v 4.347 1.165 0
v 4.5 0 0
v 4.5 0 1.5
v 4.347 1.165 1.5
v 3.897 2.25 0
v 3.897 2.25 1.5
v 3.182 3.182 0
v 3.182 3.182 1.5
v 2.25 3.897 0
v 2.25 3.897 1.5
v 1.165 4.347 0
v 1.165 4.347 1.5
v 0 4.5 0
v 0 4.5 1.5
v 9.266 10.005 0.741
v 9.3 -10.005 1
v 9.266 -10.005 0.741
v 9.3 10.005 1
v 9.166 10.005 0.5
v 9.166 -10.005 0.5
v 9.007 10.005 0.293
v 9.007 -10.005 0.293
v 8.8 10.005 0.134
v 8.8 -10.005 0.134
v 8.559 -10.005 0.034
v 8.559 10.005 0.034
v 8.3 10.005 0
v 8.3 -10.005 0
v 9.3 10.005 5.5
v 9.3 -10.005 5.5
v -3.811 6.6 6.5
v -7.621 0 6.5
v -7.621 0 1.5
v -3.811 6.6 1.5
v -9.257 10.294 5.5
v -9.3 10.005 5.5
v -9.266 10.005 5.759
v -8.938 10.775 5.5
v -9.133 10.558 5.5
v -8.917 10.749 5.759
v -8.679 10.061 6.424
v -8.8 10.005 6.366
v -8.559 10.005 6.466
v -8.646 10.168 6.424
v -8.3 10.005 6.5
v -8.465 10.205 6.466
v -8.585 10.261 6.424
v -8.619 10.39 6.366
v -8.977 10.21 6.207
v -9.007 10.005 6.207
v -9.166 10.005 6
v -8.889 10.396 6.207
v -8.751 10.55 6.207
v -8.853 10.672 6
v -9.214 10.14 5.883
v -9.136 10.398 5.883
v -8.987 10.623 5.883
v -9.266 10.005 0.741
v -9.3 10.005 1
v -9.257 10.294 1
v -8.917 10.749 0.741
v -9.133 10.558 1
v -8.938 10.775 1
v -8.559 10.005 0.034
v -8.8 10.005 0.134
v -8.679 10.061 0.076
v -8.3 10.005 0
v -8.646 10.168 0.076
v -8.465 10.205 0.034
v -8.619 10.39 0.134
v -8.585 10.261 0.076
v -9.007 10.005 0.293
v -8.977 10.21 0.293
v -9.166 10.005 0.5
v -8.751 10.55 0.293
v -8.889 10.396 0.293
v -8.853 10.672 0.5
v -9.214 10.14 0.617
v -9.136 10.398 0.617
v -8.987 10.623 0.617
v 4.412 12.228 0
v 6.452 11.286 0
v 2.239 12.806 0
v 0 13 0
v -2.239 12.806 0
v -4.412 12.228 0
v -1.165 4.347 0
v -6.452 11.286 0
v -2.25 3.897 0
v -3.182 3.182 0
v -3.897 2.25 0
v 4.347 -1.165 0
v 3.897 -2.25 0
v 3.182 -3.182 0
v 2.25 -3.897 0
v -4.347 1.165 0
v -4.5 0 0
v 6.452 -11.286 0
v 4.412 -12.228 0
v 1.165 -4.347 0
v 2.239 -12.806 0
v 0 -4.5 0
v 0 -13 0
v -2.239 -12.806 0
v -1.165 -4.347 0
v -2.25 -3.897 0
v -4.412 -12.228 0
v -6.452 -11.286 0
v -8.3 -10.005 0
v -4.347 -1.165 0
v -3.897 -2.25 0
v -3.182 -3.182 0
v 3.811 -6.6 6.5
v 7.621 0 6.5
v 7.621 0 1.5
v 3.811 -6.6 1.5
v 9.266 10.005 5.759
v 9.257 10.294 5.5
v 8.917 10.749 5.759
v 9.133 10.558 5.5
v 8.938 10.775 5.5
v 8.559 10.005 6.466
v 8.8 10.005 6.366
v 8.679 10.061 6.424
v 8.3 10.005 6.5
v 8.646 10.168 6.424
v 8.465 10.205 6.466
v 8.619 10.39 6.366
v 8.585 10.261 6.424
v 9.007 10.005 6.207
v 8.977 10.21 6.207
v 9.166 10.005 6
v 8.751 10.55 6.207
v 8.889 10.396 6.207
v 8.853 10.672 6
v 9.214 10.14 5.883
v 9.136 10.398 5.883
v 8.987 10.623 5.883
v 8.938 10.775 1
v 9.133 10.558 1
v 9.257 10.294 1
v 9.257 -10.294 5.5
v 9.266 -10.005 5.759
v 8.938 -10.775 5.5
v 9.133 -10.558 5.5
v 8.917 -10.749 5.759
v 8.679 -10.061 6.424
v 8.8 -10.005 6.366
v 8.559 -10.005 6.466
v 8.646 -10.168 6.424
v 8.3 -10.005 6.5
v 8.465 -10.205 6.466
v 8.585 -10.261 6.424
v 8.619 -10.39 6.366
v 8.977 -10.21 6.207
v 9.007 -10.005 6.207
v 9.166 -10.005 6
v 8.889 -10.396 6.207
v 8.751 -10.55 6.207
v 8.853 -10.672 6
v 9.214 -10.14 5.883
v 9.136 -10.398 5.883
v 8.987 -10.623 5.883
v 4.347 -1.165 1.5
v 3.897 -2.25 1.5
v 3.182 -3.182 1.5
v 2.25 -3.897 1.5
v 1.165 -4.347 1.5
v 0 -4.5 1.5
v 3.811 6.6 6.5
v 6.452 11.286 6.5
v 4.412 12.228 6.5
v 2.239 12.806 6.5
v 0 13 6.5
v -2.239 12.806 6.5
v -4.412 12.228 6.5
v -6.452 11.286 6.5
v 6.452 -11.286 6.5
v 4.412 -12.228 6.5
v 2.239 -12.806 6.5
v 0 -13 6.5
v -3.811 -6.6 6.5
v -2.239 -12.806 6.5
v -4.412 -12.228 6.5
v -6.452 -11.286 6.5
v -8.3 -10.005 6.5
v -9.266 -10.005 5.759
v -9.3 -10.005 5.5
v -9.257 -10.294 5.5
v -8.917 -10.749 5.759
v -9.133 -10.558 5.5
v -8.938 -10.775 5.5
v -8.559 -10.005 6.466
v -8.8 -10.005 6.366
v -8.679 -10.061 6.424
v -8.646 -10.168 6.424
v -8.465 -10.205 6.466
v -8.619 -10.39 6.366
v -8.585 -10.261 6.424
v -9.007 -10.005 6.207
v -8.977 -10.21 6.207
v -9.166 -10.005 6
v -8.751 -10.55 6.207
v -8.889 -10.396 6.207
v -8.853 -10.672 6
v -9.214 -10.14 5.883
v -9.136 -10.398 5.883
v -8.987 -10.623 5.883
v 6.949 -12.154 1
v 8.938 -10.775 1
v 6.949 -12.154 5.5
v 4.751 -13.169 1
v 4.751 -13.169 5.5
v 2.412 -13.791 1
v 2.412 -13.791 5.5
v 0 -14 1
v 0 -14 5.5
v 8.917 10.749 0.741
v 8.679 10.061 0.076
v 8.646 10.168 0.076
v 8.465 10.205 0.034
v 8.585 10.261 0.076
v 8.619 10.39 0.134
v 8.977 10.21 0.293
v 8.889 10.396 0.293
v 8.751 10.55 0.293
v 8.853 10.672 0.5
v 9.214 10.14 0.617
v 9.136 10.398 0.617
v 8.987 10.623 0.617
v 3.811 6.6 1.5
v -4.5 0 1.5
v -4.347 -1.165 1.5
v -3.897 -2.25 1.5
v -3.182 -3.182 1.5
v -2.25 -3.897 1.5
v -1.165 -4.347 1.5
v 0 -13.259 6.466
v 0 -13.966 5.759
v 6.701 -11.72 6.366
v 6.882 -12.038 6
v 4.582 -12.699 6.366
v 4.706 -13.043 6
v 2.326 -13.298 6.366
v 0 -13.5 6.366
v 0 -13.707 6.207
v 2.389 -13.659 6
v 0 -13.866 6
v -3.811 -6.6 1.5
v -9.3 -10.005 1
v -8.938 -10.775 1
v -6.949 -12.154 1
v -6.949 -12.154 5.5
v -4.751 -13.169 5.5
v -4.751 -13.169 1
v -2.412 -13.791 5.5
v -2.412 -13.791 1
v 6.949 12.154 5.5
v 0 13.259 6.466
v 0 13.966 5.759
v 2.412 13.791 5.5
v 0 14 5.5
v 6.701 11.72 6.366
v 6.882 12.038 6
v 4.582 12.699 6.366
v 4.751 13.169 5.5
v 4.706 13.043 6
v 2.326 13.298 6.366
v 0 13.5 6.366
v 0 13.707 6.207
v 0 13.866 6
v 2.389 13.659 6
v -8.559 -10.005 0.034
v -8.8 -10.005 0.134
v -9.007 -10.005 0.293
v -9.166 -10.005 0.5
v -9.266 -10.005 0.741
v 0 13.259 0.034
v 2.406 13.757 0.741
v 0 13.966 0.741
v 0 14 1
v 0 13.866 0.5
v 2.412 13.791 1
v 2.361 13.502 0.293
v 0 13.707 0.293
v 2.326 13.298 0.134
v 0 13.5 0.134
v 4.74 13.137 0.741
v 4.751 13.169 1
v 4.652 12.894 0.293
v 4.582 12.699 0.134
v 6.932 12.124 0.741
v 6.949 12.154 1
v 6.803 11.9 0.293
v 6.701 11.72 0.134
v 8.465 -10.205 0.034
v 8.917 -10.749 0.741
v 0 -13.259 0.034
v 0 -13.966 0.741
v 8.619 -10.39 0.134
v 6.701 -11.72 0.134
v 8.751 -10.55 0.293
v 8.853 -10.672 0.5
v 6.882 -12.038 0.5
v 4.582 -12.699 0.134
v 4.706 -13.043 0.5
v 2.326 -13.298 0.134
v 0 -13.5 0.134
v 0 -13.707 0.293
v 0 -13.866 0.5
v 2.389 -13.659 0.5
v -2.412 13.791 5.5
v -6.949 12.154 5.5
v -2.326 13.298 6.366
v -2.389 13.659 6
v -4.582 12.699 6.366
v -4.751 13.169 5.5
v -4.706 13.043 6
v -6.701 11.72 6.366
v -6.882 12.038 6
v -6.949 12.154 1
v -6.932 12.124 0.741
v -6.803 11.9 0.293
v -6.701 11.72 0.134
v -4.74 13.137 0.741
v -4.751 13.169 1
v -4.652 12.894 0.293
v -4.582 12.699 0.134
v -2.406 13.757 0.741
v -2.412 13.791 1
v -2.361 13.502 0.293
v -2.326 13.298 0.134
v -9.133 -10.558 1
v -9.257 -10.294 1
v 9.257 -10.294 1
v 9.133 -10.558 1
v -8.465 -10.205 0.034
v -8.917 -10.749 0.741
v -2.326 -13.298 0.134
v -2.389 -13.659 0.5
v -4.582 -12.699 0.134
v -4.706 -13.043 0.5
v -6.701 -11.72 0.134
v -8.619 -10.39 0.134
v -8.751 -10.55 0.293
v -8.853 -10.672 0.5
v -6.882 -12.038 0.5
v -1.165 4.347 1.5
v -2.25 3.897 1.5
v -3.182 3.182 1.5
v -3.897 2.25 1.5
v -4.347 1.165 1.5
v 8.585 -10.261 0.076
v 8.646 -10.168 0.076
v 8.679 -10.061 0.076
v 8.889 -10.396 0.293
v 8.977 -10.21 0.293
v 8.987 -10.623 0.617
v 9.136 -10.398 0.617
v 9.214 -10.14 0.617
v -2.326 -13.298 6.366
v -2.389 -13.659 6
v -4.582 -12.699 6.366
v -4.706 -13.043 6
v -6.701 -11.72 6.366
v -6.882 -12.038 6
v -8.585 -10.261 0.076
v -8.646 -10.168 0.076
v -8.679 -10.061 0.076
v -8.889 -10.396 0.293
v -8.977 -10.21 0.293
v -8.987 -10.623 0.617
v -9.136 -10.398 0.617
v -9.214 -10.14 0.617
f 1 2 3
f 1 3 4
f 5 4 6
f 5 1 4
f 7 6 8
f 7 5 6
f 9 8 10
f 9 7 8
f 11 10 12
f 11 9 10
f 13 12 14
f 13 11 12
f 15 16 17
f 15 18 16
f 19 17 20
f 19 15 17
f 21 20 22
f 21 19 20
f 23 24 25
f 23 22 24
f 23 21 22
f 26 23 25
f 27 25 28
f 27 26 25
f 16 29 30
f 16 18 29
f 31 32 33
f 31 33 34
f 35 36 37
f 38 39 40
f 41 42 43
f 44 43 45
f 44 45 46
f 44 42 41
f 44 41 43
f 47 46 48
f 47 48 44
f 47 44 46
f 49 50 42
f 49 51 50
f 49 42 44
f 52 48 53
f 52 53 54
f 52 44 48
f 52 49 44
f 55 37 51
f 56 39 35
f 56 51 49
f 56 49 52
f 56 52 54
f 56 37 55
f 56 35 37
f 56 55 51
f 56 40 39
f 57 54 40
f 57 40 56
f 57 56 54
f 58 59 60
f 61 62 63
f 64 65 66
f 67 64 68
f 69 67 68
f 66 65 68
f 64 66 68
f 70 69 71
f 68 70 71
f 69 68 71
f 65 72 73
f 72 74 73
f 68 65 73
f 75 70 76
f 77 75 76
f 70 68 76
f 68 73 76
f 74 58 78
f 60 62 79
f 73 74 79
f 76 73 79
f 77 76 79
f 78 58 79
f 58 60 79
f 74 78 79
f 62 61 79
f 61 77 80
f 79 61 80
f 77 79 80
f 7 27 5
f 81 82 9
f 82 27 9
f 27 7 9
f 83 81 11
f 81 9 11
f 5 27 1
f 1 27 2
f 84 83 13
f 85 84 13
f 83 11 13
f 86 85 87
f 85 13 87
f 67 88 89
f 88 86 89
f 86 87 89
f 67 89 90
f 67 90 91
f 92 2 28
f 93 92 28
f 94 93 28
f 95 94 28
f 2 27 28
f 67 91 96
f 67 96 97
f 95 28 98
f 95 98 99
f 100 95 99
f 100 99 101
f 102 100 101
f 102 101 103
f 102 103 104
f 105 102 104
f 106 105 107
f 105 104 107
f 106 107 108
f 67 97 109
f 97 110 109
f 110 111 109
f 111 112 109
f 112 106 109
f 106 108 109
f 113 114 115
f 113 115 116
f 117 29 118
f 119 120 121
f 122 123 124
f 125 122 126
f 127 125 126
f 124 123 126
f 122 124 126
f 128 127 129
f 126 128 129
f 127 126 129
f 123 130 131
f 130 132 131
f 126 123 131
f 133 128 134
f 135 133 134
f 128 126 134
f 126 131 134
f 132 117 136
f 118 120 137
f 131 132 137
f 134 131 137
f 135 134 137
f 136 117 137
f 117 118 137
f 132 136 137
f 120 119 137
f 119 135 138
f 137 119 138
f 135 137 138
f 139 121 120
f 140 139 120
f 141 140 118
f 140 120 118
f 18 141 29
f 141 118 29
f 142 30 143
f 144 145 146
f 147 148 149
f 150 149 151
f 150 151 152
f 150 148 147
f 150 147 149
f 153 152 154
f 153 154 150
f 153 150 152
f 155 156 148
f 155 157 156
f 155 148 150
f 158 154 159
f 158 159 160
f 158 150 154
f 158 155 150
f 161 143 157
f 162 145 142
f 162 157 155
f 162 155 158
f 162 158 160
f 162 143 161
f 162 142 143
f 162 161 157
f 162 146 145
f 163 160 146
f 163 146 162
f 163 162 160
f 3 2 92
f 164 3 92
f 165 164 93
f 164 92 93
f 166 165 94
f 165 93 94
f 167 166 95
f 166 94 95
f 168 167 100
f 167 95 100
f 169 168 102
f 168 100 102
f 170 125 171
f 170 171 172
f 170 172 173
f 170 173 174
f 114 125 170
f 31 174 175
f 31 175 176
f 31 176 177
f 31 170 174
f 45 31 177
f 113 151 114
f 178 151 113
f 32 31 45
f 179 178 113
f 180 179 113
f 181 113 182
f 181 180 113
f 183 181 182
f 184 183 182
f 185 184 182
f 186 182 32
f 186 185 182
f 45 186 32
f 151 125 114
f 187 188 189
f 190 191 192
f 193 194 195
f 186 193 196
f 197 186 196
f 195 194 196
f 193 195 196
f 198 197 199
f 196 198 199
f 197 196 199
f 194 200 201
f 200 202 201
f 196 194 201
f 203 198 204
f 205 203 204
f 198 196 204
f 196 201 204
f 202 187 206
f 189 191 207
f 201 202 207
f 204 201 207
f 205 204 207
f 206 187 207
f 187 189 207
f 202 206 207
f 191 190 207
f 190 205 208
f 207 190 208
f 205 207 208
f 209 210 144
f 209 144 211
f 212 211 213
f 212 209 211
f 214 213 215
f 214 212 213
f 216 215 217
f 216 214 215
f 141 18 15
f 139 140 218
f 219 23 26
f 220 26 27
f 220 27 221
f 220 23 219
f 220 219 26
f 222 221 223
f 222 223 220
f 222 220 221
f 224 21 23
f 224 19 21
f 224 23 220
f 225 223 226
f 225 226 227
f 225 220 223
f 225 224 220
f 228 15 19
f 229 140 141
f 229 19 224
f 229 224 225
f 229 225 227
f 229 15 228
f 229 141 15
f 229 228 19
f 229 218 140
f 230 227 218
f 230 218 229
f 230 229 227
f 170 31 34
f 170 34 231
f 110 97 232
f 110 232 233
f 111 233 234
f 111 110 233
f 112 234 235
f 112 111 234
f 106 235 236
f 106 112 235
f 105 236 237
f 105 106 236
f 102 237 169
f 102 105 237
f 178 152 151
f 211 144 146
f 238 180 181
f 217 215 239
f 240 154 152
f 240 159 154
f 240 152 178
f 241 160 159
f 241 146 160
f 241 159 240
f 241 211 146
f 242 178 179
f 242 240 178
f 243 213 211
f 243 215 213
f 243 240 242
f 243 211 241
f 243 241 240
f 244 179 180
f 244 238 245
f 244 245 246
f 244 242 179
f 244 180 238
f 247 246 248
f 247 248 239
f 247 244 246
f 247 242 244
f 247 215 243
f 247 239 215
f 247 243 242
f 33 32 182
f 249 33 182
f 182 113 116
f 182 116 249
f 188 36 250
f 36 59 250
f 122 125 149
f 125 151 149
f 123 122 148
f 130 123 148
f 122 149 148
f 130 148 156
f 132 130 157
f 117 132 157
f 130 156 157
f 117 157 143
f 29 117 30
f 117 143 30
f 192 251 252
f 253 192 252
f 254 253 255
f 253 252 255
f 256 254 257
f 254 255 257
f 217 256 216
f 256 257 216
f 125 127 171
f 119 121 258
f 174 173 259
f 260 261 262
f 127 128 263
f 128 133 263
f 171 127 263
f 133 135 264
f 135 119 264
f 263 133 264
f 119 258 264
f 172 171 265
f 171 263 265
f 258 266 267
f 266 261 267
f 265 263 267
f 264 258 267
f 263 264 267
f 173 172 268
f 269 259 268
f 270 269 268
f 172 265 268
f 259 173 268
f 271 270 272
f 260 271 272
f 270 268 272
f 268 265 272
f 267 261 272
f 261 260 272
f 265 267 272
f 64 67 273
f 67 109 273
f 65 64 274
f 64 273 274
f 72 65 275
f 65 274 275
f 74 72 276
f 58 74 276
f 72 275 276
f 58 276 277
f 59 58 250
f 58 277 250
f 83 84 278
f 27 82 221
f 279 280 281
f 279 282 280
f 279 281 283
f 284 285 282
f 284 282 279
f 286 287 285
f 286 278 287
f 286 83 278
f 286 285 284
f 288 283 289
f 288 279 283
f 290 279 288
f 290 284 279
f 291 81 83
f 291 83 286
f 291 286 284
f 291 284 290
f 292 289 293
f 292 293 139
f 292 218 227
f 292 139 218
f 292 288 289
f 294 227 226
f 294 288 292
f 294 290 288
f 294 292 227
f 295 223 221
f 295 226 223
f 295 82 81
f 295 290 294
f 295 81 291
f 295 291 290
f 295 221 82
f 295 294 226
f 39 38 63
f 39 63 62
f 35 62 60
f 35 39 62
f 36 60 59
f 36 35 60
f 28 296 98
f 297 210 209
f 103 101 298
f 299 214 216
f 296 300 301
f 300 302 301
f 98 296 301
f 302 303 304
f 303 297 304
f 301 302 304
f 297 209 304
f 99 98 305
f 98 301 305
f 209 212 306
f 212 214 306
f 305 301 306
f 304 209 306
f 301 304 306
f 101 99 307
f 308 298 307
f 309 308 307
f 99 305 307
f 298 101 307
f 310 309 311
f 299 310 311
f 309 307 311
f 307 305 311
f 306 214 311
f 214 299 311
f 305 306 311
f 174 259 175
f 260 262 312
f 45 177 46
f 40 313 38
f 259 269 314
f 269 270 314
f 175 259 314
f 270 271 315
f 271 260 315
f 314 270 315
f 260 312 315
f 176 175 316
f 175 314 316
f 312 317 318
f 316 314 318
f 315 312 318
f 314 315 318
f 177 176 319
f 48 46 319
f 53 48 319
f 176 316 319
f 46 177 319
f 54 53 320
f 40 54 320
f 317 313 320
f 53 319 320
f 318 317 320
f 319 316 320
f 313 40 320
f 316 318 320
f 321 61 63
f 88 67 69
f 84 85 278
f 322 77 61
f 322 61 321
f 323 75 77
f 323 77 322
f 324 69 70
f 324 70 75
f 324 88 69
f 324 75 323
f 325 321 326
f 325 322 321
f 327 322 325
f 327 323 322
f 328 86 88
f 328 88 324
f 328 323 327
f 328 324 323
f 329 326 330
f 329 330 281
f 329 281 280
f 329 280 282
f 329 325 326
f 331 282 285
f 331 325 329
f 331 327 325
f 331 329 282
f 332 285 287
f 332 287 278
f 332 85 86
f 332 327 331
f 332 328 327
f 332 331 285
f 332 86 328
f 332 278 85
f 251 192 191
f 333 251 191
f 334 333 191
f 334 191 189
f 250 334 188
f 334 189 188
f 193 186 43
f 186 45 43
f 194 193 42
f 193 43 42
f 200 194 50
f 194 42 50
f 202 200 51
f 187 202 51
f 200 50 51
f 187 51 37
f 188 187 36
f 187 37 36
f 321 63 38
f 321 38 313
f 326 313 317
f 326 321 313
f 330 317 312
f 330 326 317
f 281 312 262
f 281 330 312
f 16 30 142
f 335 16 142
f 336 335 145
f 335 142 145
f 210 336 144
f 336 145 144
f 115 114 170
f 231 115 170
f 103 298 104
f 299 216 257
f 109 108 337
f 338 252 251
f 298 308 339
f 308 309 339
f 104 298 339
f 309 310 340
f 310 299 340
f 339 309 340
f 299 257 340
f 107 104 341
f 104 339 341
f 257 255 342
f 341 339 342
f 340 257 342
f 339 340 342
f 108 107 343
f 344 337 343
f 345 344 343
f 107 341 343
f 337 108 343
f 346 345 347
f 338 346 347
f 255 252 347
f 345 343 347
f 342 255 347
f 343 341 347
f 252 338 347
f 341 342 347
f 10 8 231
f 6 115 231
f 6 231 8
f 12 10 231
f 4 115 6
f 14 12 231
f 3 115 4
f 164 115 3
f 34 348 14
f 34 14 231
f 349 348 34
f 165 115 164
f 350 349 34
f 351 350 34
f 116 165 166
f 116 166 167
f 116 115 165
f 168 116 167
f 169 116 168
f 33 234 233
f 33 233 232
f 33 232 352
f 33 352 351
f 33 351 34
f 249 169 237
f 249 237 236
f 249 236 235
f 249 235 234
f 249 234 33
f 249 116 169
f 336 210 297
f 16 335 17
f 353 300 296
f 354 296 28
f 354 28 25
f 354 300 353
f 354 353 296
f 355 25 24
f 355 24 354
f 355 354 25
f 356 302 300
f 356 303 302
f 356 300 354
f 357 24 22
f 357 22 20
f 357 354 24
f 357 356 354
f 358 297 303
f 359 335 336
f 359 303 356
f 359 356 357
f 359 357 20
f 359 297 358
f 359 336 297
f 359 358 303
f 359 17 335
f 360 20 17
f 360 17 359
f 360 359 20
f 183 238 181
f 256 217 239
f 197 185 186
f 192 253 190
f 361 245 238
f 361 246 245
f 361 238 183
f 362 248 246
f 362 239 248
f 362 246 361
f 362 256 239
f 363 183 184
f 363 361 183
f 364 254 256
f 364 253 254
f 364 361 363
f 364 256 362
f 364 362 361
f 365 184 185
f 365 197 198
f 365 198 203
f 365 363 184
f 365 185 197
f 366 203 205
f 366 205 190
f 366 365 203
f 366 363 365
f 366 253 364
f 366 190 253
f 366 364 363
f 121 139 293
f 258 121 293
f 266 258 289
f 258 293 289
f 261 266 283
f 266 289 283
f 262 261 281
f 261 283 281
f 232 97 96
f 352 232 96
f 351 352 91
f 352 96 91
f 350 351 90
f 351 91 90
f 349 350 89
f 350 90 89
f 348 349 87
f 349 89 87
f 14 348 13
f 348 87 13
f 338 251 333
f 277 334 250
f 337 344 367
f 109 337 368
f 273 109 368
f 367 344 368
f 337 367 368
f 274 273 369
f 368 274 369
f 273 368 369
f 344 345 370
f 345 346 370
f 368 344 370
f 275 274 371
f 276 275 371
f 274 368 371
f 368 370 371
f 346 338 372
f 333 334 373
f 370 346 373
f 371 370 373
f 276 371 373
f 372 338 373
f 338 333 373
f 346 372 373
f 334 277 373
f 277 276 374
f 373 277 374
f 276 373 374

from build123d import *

# Parameters (mm, degrees)
PAD_DEPTH               = 6.5
POCKET_DEPTH            = 5
PAD_MIRRORED_2_DEPTH    = 6.5
POCKET_MIRRORED_2_DEPTH = 5
FILLET_R                = 1


with BuildPart() as part:
    # Sketch → Pad (new body)
    with BuildSketch(Plane.XY):
        with BuildLine():
            ThreePointArc((9.3, 10.464703), (4.974644, 13.086364), (0, 14))
            Line((0, 4.5), (0, 14))
            ThreePointArc((4.5, 0), (3.181981, 3.181981), (0, 4.5))
            Line((4.5, 0), (9.3, 0))
            Line((9.3, 0), (9.3, 10.464703))
        make_face()
    pad = extrude(amount=PAD_DEPTH)

    # Sketch001 → Pocket (cut)
    with BuildSketch(Plane.XY.offset(6.5)):
        Polygon((7.621024, 0), (3.810512, 6.6), (-3.810512, 6.6), (-7.621024, 0), (-3.810512, -6.6), (3.810512, -6.6), align=None)
    pocket = extrude(amount=-POCKET_DEPTH, mode=Mode.SUBTRACT)

    # Sketch Mirrored 2 → Pad Mirrored 2 (add)
    with BuildSketch(Plane(origin=(0, 0, 0), x_dir=(-1, 0, 0), z_dir=(0, 0, -1))):
        with BuildLine():
            ThreePointArc((9.3, 10.464703), (4.974644, 13.086364), (0, 14))
            Line((0, 4.5), (0, 14))
            ThreePointArc((4.5, 0), (3.181981, 3.181981), (0, 4.5))
            Line((4.5, 0), (9.3, 0))
            Line((9.3, 0), (9.3, 10.464703))
        make_face()
    pad_mirrored_2 = extrude(amount=-PAD_MIRRORED_2_DEPTH)

    # Sketch001 Mirrored 2 → Pocket Mirrored 2 (cut)
    with BuildSketch(Plane(origin=(0, 0, 6.5), x_dir=(-1, 0, 0), z_dir=(0, 0, -1))):
        Polygon((7.621024, 0), (3.810512, 6.6), (-3.810512, 6.6), (-7.621024, 0), (-3.810512, -6.6), (3.810512, -6.6), align=None)
    pocket_mirrored_2 = extrude(amount=POCKET_MIRRORED_2_DEPTH, mode=Mode.SUBTRACT)

    # Mirrored001: Pad, Pocket, Pad Mirrored 2, Pocket Mirrored 2 across Sketch H_Axis
    add(pad.mirror(Plane.ZX))
    add(pocket.mirror(Plane.ZX), mode=Mode.SUBTRACT)
    add(pad_mirrored_2.mirror(Plane.ZX))
    add(pocket_mirrored_2.mirror(Plane.ZX), mode=Mode.SUBTRACT)

    # Fillet
    fillet_edges = [part.edges().sort_by_distance(p)[0] for p in [
        (-9.3, -5.232351, 6.5),
        (9.3, -5.232351, 6.5),
        (4.974644, -13.086364, 6.5),
        (4.974644, 13.086364, 6.5),
        (4.974644, -13.086364, 0),
        (9.3, -5.232351, 0),
        (-9.3, -5.232351, 0),
        (-4.974644, 13.086364, 0),
        (9.3, -10.464703, 3.25),
        (-9.3, -10.464703, 3.25),
        (-9.3, 10.464703, 3.25),
        (9.3, 10.464703, 3.25),
    ]]
    fillet(fillet_edges, radius=FILLET_R)


solid = part.part
